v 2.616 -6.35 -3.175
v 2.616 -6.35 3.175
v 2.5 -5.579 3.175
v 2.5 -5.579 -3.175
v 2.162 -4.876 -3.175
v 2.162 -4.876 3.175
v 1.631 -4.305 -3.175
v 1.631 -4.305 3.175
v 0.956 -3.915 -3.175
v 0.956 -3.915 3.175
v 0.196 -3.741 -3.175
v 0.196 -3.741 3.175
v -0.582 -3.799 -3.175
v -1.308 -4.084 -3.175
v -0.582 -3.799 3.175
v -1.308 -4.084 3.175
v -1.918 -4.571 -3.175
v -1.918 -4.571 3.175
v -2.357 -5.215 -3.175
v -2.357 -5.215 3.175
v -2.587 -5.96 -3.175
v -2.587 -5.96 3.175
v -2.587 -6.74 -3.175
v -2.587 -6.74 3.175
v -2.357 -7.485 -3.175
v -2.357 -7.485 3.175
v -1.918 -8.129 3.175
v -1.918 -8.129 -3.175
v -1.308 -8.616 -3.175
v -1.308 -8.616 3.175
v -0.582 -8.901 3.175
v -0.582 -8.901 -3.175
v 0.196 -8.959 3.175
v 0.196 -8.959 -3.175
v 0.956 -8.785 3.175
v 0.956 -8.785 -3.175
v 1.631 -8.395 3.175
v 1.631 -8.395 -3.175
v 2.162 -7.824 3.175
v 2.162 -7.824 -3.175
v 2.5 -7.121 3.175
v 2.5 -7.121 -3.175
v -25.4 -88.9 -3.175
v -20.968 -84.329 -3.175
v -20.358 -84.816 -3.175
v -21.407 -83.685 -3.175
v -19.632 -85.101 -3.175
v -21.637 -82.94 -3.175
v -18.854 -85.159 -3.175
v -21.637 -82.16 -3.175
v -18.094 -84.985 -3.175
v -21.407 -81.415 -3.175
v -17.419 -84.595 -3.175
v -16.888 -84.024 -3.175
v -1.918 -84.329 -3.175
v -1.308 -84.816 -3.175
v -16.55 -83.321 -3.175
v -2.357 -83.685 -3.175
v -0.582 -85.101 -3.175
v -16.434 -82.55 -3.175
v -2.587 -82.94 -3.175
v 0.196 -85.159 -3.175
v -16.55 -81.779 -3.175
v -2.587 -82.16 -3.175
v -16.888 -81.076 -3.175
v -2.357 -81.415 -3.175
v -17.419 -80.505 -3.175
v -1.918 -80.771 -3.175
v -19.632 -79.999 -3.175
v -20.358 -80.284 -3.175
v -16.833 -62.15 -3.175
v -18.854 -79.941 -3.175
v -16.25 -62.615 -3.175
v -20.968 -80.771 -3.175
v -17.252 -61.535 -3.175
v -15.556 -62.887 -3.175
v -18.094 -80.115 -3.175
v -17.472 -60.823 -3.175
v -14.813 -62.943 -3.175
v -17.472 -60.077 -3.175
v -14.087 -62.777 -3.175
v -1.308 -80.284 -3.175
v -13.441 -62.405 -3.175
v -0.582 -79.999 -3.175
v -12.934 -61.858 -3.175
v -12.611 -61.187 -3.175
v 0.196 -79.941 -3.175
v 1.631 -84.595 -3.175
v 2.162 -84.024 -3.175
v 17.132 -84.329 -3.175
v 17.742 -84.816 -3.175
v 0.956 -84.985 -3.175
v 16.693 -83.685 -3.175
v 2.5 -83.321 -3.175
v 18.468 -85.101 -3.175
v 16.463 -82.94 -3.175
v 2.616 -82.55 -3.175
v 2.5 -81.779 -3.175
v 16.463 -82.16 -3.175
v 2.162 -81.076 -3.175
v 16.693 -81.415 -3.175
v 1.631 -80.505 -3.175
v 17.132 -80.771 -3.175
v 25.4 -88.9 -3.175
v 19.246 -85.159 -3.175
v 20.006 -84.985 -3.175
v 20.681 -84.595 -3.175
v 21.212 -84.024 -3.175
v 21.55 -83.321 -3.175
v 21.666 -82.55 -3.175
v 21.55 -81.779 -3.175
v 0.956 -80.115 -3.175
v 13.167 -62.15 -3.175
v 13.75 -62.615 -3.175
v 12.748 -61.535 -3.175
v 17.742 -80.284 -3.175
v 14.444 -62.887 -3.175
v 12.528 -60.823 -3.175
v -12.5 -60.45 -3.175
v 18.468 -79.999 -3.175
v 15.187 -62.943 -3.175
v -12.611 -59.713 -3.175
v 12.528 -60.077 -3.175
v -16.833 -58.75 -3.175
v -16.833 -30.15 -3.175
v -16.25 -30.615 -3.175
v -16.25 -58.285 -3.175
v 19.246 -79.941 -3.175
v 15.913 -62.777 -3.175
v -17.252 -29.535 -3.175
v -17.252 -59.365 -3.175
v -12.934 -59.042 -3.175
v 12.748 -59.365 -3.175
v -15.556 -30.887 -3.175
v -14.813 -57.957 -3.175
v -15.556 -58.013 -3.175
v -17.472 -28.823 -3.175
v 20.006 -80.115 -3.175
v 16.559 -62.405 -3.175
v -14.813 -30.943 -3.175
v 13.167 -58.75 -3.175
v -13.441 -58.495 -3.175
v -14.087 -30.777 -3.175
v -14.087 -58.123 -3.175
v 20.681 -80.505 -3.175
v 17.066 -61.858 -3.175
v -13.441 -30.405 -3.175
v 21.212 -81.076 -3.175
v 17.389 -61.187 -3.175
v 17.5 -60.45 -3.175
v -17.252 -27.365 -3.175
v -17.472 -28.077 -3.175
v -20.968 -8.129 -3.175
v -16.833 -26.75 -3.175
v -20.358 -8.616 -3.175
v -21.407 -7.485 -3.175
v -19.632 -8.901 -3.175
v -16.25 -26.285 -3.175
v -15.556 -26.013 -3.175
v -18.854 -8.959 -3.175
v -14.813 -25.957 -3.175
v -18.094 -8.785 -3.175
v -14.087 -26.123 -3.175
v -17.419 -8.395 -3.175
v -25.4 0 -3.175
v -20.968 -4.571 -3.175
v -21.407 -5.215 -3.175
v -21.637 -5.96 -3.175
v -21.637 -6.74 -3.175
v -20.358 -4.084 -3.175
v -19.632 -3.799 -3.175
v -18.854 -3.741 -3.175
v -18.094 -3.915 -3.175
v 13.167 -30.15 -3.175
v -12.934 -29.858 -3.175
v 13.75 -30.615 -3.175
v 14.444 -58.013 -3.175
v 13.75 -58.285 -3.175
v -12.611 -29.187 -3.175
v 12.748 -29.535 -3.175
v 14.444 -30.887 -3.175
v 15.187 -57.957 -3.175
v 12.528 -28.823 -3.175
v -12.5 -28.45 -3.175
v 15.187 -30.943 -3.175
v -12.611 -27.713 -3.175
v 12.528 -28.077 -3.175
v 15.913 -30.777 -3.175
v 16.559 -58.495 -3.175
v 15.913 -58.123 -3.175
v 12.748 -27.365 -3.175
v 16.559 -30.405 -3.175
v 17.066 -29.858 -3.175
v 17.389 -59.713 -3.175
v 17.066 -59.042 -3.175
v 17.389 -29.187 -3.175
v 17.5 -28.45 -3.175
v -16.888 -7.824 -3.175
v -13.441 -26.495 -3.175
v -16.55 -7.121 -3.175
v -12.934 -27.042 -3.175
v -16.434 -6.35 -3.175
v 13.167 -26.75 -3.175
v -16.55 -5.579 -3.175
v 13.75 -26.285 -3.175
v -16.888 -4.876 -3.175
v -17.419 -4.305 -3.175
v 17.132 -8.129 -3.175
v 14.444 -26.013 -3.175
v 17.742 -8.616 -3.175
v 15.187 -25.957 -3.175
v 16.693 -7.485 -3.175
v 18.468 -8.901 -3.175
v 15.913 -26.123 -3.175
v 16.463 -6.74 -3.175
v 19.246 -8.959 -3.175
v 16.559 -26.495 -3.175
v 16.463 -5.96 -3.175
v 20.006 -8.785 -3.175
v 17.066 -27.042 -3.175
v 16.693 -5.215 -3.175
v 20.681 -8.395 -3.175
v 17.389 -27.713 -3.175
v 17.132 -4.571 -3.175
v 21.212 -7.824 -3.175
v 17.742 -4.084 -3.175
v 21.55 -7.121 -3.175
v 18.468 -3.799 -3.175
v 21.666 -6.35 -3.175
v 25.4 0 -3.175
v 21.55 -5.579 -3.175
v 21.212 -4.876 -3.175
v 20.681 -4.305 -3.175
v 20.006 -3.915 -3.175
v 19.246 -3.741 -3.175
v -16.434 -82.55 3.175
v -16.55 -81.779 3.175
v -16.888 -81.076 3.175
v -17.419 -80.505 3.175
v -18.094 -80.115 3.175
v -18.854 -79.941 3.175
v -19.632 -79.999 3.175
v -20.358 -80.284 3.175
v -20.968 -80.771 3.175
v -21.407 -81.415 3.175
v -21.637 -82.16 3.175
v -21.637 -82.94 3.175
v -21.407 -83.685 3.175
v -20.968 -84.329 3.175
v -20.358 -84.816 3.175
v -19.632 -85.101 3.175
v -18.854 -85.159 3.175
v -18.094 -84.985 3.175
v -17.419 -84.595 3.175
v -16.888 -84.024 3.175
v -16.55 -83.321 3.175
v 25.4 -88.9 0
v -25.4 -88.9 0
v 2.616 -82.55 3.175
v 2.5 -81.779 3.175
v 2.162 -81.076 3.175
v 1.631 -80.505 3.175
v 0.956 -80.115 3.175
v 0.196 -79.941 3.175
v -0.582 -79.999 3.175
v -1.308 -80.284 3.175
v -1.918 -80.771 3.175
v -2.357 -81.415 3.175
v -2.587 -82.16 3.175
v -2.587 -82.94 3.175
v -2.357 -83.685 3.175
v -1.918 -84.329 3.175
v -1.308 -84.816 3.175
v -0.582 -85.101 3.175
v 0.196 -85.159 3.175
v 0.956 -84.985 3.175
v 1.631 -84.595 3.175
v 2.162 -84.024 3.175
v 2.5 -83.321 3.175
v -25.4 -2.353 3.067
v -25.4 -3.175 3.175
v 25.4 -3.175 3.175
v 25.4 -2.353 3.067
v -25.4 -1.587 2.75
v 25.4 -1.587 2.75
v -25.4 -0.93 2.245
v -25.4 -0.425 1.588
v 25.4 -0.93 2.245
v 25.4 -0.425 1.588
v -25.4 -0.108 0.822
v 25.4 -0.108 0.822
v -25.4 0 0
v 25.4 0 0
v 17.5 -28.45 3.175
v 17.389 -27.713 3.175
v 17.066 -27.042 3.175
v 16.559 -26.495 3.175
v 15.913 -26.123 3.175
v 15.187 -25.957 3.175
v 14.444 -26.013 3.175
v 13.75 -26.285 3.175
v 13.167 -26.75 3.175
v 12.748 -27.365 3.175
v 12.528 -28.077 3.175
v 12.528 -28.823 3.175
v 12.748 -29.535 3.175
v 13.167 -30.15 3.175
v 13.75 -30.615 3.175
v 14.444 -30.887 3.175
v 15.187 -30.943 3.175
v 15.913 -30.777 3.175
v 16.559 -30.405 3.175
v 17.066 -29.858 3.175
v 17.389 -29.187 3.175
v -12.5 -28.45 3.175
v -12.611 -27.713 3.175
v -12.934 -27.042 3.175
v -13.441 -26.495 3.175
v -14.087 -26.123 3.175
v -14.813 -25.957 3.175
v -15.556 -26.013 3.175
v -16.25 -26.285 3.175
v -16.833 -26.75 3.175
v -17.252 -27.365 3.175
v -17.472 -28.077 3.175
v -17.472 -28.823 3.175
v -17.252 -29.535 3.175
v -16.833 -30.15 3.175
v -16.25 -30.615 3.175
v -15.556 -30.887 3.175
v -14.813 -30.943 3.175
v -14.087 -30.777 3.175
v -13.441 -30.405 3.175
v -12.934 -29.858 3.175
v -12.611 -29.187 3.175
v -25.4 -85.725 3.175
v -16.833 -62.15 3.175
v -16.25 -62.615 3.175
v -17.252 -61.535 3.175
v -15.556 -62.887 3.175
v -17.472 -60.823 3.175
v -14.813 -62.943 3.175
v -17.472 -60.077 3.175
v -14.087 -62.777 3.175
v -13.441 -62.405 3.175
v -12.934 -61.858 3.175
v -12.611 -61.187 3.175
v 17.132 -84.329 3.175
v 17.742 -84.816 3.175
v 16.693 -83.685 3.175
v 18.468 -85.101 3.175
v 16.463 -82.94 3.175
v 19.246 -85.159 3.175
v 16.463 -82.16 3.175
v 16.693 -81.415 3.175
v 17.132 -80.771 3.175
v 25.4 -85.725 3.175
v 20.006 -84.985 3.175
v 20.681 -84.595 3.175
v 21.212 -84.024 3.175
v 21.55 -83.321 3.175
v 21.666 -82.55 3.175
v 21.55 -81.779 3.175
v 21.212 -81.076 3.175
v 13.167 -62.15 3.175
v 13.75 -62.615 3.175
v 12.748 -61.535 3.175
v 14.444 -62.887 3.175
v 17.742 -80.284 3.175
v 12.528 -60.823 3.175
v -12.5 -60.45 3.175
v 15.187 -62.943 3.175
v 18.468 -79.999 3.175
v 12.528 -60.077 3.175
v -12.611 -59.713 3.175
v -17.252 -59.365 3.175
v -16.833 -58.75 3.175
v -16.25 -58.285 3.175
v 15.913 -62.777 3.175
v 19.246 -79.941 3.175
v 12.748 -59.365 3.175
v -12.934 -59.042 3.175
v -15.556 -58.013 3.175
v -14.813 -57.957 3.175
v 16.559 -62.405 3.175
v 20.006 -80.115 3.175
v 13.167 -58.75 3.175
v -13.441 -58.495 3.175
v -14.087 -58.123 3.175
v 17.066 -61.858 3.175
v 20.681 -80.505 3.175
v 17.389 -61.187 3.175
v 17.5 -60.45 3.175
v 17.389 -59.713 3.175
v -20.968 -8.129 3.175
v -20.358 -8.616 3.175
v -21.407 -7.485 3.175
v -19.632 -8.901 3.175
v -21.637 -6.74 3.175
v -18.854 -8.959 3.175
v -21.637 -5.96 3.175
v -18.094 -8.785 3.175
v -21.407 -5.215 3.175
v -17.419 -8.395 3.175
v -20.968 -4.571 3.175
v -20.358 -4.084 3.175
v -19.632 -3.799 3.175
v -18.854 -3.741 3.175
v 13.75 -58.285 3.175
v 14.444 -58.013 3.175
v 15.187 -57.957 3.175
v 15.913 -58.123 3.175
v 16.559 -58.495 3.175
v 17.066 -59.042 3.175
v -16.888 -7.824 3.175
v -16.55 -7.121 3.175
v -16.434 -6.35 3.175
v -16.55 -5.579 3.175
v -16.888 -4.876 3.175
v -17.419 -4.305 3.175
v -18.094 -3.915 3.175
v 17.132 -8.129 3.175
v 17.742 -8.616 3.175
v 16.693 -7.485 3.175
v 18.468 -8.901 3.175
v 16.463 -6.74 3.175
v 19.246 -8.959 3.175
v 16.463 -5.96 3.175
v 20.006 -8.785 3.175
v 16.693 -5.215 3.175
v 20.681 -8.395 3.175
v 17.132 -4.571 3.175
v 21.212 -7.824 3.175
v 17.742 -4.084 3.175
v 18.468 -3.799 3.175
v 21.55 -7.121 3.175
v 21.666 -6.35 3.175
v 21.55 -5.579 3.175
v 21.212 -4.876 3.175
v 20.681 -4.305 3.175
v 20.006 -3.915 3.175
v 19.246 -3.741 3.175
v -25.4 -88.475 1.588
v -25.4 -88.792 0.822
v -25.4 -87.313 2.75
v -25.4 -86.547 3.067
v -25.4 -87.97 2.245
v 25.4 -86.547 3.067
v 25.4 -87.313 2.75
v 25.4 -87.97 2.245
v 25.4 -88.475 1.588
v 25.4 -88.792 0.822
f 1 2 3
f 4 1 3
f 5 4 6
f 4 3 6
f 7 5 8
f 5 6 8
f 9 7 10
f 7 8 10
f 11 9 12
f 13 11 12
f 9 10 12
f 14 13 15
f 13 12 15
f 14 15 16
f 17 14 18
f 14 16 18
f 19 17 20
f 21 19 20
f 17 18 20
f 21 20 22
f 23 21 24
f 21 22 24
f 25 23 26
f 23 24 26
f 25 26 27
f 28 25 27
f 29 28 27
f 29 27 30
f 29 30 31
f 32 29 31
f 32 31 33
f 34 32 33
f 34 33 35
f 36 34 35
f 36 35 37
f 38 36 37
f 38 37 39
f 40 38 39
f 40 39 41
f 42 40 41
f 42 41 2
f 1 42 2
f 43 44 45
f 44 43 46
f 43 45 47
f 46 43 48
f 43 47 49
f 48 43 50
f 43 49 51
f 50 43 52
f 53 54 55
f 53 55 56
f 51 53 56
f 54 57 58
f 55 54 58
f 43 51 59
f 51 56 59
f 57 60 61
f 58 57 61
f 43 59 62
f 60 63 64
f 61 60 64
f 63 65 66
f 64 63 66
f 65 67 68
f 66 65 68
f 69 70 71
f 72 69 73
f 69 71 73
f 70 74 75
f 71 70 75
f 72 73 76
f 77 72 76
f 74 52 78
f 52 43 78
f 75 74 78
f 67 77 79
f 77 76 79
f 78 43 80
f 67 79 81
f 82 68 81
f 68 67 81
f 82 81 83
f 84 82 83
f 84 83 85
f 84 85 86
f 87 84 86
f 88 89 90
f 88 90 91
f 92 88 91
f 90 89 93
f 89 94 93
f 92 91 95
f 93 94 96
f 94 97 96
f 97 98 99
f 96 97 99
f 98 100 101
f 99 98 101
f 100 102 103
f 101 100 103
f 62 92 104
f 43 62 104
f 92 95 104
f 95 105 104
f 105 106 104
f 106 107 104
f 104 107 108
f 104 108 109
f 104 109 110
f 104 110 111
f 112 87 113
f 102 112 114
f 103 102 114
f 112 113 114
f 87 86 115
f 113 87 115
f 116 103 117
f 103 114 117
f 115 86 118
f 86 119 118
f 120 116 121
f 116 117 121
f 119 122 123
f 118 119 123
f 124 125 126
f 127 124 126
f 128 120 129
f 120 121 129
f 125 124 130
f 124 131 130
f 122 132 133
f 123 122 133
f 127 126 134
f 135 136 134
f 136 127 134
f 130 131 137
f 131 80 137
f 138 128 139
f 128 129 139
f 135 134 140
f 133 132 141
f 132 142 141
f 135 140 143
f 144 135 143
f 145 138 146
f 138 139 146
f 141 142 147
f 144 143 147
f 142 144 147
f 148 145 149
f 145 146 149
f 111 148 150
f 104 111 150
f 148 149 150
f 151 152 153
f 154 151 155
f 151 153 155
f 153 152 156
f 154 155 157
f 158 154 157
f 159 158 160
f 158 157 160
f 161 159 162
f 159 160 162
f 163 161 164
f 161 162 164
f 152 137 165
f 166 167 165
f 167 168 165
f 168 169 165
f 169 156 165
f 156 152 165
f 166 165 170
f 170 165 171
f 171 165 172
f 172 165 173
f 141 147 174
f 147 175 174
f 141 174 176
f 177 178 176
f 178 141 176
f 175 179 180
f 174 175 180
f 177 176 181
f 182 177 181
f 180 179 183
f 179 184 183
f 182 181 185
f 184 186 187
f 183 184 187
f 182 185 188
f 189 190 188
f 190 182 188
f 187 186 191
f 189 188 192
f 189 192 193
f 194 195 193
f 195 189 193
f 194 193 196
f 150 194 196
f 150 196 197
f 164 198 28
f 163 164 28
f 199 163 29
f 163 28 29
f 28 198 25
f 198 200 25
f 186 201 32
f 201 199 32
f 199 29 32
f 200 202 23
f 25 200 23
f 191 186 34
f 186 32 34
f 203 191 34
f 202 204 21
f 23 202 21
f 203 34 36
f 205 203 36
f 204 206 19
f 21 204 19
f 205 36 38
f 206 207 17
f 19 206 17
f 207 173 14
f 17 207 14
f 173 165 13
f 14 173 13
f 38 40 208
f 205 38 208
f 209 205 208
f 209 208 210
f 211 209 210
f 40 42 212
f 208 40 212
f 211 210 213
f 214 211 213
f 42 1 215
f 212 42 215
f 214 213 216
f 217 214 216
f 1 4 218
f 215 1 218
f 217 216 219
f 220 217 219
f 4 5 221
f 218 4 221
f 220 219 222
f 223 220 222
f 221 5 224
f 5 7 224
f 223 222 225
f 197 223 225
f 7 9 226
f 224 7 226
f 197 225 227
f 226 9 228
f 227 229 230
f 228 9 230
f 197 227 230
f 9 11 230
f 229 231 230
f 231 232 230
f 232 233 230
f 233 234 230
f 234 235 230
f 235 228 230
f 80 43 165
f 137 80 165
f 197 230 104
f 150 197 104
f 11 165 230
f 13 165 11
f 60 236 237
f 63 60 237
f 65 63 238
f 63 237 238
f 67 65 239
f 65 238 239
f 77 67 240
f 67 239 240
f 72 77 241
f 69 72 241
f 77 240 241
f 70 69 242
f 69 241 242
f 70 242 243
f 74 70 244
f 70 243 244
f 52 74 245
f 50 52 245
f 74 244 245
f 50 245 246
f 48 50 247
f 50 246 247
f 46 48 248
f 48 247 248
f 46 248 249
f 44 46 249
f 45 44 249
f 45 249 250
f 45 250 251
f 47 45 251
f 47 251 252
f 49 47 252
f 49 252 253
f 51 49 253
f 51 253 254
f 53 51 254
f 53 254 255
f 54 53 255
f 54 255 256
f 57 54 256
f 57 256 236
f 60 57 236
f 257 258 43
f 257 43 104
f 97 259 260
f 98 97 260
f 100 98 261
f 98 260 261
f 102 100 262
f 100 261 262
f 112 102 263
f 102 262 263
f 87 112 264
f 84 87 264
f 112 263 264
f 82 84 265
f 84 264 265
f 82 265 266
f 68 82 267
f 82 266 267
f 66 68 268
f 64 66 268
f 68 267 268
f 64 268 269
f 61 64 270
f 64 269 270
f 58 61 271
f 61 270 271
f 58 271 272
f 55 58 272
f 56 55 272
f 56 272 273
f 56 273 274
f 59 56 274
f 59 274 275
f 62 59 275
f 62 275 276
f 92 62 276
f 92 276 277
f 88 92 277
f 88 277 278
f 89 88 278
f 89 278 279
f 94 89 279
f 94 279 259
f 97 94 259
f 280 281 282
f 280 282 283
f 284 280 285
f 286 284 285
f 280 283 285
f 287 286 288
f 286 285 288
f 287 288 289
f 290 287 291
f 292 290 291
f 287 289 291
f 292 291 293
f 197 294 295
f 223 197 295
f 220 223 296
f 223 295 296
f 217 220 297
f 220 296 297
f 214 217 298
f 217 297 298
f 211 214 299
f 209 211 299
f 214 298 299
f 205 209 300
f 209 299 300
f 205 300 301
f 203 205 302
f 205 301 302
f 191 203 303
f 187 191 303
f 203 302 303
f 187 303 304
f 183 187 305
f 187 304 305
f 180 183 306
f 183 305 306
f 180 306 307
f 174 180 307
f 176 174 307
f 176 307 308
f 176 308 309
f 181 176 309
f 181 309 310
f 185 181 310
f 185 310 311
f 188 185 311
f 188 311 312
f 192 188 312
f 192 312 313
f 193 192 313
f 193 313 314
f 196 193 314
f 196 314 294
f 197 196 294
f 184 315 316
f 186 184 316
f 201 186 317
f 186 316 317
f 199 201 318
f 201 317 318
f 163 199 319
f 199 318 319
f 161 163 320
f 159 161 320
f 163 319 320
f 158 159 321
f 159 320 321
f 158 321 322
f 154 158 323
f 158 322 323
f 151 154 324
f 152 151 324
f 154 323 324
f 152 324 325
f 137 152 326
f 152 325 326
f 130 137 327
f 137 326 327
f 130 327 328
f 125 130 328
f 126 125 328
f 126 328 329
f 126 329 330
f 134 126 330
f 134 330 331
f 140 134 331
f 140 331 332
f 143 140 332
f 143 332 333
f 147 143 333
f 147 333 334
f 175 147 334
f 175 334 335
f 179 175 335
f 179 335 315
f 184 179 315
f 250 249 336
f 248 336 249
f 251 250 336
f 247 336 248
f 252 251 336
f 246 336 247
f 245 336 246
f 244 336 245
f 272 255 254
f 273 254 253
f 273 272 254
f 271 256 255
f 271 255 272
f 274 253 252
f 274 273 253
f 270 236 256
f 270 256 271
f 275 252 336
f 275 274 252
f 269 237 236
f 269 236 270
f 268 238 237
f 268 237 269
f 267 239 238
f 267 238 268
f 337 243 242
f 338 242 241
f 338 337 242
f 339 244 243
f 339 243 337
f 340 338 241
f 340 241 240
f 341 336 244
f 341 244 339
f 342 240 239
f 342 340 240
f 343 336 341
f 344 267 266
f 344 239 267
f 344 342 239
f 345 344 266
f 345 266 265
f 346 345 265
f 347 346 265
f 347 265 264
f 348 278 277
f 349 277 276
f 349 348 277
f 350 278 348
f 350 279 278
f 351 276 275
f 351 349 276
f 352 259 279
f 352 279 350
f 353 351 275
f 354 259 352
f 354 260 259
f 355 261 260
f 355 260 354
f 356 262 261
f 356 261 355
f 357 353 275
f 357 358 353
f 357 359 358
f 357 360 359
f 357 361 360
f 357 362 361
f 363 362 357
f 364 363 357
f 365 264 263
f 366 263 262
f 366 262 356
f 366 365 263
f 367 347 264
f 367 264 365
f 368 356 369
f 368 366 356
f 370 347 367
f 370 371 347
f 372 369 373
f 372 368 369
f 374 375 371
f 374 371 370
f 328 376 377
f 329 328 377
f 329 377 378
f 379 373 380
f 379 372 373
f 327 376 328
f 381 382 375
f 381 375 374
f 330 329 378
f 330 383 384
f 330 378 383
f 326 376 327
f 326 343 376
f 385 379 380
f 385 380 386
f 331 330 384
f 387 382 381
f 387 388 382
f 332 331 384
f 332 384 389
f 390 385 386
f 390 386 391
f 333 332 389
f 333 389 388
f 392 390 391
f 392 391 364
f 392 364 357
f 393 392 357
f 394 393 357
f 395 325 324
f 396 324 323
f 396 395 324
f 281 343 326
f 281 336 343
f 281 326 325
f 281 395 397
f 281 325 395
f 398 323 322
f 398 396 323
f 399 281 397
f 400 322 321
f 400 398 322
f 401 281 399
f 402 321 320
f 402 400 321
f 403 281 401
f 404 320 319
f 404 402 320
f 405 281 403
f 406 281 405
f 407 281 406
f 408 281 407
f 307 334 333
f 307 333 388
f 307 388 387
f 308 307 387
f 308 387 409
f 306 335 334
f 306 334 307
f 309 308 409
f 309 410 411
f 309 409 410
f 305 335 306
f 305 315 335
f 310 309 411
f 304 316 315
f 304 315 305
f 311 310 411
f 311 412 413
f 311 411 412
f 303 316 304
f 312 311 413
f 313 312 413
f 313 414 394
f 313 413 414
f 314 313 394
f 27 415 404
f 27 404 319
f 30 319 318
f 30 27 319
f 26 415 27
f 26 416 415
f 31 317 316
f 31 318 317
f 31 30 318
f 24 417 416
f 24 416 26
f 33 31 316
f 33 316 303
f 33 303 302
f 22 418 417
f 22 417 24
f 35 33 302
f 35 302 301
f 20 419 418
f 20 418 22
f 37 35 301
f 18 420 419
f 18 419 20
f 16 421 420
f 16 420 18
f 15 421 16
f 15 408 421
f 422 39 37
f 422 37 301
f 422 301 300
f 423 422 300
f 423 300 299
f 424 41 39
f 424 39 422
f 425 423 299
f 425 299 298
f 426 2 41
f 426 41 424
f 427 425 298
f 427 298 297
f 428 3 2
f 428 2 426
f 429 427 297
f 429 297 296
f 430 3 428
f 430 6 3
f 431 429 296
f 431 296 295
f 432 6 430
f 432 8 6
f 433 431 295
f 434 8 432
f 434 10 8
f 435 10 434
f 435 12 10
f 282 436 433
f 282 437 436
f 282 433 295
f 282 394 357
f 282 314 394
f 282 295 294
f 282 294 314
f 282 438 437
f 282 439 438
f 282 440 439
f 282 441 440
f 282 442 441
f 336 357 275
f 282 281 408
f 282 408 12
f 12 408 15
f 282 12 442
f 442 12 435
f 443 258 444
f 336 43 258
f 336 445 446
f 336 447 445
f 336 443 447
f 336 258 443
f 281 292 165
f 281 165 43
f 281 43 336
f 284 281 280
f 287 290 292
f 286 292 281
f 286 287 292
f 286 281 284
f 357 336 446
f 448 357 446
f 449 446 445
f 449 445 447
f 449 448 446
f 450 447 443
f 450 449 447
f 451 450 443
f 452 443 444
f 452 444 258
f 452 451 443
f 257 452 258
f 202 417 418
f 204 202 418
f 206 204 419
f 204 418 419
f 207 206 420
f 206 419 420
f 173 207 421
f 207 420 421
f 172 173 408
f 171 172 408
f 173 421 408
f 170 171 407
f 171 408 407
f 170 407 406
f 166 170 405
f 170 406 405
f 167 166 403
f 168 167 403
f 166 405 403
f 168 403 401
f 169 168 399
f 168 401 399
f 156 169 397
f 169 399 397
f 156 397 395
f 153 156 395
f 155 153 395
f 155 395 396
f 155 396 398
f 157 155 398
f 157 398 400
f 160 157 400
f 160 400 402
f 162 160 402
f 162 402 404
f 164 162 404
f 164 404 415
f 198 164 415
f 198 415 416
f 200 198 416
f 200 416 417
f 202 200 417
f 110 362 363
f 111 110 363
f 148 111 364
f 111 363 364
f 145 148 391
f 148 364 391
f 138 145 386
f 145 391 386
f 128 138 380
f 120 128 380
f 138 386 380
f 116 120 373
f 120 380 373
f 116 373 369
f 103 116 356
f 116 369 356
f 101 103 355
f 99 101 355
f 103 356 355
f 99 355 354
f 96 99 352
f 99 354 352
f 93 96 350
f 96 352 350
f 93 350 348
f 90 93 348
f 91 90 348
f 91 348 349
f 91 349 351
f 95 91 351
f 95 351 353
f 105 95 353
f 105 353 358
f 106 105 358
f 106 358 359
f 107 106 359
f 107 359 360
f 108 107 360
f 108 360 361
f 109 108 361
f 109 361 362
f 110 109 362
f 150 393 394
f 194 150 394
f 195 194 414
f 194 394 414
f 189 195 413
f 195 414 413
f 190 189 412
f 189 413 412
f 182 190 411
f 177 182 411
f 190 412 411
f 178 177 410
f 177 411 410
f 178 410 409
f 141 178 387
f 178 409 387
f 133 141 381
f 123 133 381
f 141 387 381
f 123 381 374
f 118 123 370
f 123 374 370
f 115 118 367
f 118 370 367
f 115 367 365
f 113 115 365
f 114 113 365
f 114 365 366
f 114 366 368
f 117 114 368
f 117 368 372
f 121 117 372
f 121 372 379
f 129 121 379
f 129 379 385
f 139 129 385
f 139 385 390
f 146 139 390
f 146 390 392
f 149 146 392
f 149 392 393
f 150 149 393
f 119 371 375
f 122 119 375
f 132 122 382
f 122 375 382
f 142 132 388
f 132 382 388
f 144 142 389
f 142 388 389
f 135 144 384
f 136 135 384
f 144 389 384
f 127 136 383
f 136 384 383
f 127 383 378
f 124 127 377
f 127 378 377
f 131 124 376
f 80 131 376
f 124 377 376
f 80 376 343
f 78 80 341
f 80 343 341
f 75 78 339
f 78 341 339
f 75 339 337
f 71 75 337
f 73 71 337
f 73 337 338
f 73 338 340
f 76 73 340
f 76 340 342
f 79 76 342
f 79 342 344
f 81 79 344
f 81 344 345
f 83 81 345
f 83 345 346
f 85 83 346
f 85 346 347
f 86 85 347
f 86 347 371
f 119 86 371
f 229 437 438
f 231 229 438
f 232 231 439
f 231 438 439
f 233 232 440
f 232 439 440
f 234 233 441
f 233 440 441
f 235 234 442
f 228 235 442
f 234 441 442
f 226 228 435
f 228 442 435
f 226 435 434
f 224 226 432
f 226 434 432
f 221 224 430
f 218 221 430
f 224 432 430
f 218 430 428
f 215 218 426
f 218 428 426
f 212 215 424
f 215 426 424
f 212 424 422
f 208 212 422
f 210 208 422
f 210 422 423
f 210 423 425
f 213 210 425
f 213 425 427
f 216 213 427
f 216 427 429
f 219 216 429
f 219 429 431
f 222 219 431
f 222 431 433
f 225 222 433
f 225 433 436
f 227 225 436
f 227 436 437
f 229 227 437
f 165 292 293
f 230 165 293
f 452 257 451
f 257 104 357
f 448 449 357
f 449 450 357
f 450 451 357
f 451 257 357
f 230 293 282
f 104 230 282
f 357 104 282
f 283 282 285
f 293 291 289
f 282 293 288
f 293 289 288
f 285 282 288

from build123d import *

# Parameters (mm, degrees)
F0_W     = 50.8
F0_H     = 6.35
F1_DEPTH = 88.9
F2_R     = 2.6162
F2_R_2   = 2.5
F3_DEPTH = 6.351
F4_R     = 3.175


with BuildPart() as f1:
    # F0 (on Front) → F1 (new body)
    with BuildSketch(Plane.XZ):
        Rectangle(F0_W, F0_H)
    extrude(amount=F1_DEPTH)

    # F2 (on face) → F3 (cut, through all)
    with BuildSketch(Plane.XY.offset(3.175)):
        with Locations((0, -82.55)):
            Circle(F2_R)
        with Locations((0, -6.35)):
            Circle(F2_R)
        with Locations((-19.05, -82.55)):
            Circle(F2_R)
        with Locations((19.05, -82.55)):
            Circle(F2_R)
        with Locations((19.05, -6.35)):
            Circle(F2_R)
        with Locations((-19.05, -6.35)):
            Circle(F2_R)
        with Locations((-15, -60.45)):
            Circle(F2_R_2)
        with Locations((15, -60.45)):
            Circle(F2_R_2)
        with Locations((15, -28.45)):
            Circle(F2_R_2)
        with Locations((-15, -28.45)):
            Circle(F2_R_2)
    extrude(amount=-F3_DEPTH, mode=Mode.SUBTRACT)

    # F4
    f4_edges = [f1.edges().sort_by_distance(p)[0] for p in [
        (0, 0, 3.175),
        (0, -88.9, 3.175),
    ]]
    fillet(f4_edges, radius=F4_R)


solid = f1.part
